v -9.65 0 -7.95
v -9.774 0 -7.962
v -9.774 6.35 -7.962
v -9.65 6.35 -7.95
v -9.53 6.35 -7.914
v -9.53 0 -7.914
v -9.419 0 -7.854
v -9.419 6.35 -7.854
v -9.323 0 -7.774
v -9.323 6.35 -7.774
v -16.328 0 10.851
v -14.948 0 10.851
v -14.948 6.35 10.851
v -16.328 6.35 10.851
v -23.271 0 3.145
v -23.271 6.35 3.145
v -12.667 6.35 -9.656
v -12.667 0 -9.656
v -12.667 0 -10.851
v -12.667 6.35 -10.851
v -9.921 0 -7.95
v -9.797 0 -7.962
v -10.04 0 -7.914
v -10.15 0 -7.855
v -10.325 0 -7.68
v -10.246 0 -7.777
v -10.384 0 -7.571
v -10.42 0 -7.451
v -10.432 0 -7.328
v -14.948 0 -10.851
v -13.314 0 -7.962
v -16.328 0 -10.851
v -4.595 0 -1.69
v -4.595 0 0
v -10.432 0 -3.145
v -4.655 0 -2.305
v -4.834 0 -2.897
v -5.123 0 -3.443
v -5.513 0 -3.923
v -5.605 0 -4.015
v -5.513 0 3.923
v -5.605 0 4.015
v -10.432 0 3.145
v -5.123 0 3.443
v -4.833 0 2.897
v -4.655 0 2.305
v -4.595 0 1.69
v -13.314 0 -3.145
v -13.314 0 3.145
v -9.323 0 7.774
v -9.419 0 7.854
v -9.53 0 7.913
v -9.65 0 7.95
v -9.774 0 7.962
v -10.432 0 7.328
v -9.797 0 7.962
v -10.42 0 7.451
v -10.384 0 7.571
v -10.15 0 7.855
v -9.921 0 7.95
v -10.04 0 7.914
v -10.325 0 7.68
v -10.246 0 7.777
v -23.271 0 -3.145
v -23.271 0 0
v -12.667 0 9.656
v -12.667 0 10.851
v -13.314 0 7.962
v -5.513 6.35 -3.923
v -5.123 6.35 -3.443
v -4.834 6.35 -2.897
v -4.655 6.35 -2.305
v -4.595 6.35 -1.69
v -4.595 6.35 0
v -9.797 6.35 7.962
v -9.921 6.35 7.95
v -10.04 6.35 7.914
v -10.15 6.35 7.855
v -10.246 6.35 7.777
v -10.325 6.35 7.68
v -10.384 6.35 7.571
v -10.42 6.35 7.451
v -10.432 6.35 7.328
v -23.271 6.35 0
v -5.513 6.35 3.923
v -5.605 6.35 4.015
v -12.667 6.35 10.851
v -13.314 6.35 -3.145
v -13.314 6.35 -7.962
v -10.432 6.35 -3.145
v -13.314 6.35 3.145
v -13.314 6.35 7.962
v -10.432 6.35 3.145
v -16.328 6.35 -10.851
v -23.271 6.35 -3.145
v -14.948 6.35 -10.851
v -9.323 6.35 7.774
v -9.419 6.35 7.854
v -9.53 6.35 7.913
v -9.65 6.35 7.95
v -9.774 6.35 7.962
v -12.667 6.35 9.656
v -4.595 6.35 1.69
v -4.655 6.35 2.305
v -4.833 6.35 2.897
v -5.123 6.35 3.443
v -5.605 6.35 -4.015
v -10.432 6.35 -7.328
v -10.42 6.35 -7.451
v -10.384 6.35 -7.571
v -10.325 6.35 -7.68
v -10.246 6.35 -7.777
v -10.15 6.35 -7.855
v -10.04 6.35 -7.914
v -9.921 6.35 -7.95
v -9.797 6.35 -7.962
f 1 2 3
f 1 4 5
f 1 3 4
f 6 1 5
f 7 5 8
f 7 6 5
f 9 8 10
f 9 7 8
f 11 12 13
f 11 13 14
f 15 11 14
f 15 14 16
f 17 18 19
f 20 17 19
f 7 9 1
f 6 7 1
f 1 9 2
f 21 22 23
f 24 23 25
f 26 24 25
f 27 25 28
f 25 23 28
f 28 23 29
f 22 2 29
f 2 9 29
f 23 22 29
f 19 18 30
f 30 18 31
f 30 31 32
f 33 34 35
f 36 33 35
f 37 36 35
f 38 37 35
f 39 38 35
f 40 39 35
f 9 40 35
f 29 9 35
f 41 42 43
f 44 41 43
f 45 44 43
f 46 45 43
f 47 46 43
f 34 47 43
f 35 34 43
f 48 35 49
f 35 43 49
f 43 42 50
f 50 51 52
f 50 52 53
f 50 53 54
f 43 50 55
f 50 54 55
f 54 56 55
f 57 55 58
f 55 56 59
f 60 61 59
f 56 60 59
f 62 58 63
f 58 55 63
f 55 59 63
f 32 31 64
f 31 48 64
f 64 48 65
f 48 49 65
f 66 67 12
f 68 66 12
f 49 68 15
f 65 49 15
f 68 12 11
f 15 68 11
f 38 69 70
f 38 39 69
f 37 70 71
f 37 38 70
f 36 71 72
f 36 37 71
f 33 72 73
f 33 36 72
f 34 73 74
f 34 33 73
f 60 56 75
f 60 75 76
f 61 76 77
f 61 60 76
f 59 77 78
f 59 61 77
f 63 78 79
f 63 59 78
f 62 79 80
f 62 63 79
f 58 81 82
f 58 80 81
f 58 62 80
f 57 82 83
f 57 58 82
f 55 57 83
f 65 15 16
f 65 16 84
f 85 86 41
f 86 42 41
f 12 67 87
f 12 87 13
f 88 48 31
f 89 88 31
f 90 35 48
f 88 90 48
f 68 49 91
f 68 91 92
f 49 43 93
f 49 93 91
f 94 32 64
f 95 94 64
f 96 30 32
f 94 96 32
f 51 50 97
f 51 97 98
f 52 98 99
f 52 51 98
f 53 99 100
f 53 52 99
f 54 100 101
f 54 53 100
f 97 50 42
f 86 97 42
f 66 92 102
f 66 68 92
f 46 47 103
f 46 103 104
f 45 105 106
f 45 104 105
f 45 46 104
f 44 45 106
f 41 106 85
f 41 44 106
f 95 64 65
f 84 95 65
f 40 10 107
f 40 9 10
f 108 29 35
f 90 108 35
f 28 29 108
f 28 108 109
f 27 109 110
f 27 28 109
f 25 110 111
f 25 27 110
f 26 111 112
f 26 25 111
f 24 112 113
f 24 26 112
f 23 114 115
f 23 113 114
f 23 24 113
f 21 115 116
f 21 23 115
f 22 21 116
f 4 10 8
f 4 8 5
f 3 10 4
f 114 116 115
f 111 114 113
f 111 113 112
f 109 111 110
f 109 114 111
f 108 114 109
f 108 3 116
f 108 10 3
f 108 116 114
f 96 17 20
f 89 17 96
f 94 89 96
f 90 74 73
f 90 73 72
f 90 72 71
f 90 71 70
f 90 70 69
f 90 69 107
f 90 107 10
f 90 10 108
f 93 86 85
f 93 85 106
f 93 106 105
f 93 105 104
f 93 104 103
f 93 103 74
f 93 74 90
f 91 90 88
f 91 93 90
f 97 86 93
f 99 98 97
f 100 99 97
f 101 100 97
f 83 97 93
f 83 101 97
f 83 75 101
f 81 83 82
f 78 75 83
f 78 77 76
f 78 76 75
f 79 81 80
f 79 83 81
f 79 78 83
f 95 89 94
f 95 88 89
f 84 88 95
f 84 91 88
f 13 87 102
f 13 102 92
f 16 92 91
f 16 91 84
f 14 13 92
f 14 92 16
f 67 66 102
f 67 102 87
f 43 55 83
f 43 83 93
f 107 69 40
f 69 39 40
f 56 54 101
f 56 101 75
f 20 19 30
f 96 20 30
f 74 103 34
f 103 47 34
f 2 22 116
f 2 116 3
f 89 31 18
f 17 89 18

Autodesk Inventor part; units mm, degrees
ref_plane "YZ Plane" through (0, 0, 0) normal (1, 0, 0) x (0, 1, 0)
ref_plane "XZ Plane" through (0, 0, 0) normal (0, 1, 0) x (-1, 0, 0)
ref_plane "XY Plane" through (0, 0, 0) normal (0, 0, 1) x (1, 0, 0)
sketch "Sketch1" plane through (0, 0, 0) normal (0, 1, 0) x (-1, 0, 0)
  line L0 (-12.7, 12.7) -> (12.7, 12.7)
  line L1 (12.7, 12.7) -> (12.7, -12.7)
  line L2 (12.7, -12.7) -> (-12.7, -12.7)
  line L3 (-12.7, -12.7) -> (-12.7, 12.7)
  line L4 (-12.7, 12.7) -> (12.7, -12.7) construction
  line L5 (12.7, 12.7) -> (-12.7, -12.7) construction
  line L6 (14.9209, 3.2512) -> (10.4791, 3.2512)
  line L7 (10.4791, 3.2512) -> (10.4791, -3.2512)
  line L8 (10.4791, -3.2512) -> (14.9209, -3.2512)
  line L9 (14.9209, -3.2512) -> (14.9209, 3.2512)
  line L10 (14.9209, 3.2512) -> (10.4791, -3.2512) construction
  line L11 (10.4791, 3.2512) -> (14.9209, -3.2512) construction
  line L12 (12.7, 3.2512) -> (10.4902, 3.2512)
  line L13 (10.4902, 3.2512) -> (10.4902, 9.3687)
  line L14 (10.4902, 9.3687) -> (12.7, 9.3687)
  line L15 (12.7, 9.3687) -> (12.7, 3.2512)
  line L16 (-4.5426, 4.5426) -> (4.5426, 4.5426)
  line L17 (4.5426, 1.686) -> (4.5426, -1.686)
  line L18 (4.5426, -4.5426) -> (-4.5426, -4.5426)
  line L19 (-4.5426, -4.5426) -> (-4.5426, 4.5426)
  line L20 (-4.5426, 4.5426) -> (4.5426, -4.5426) construction
  line L21 (4.5426, 4.5426) -> (-4.5426, -4.5426) construction
  line L22 (12.7, 12.7) -> (-12.7, -12.7) construction
  line L23 (11.9293, 13.4707) -> (-13.4707, -11.9293)
  line L24 (5.4725, 3.9311) -> (13.4707, 11.9293)
  arc A0 (13.4707, 11.9293) -> (11.9293, 13.4707) centre (12.7, 12.7) ccw
  arc A1 (-13.4707, -11.9293) -> (-11.9293, -13.4707) centre (-12.7, -12.7) ccw
  line L25 (12.7, -12.7) -> (-12.7, 12.7) construction
  line L26 (11.9293, -13.4707) -> (-13.4707, 11.9293)
  line L27 (5.4725, -3.9311) -> (13.4707, -11.9293)
  arc A2 (11.9293, -13.4707) -> (13.4707, -11.9293) centre (12.7, -12.7) ccw
  arc A3 (-11.9293, 13.4707) -> (-13.4707, 11.9293) centre (-12.7, 12.7) ccw
  arc A4 (5.4725, 3.9311) -> (4.5426, 1.686) centre (7.7176, 1.686) ccw
  arc A5 (4.5426, -1.686) -> (5.4725, -3.9311) centre (7.7176, -1.686) ccw
  point P0 (0, 0)
  point P1 (12.7, 0)
  point P2 (0, 0)
  point P3 (0, 0)
  dimension "d0" = 25.4
  dimension "d1" = 25.4
  dimension "d2" = 6.5024
  dimension "d3" = 2.2098
  dimension "d4" = 3.175
sketch "Sketch2" plane through (0, 0, 0) normal (0, 1, 0) x (-1, 0, 0)
  line L0 (9.3228, 7.7741) -> (5.6047, 4.0154)
  line L1 (5.6047, 4.0154) -> (5.5129, 3.9226)
  line L2 (4.5951, 1.6897) -> (4.5951, 0)
  line L3 (9.7743, 7.9625) -> (9.7971, 7.9625)
  line L4 (10.4321, 7.3275) -> (10.4321, 3.1448)
  line L5 (10.4321, 3.1448) -> (13.3143, 3.1448)
  arc A0 (5.5129, 3.9226) -> (4.5951, 1.6897) centre (7.7701, 1.6897) ccw
  arc A1 (9.7743, 7.9625) -> (9.3228, 7.7741) centre (9.7743, 7.3275) ccw
  arc A2 (10.4321, 7.3275) -> (9.7971, 7.9625) centre (9.7971, 7.3275) ccw
  line L6 (13.3143, 3.1448) -> (13.3143, 7.9625)
  line L7 (13.3143, 7.9625) -> (12.6666, 9.6561)
  line L8 (12.6666, 9.6561) -> (12.6666, 10.8508)
  line L9 (12.6666, 10.8508) -> (14.9475, 10.8508)
  line L10 (14.9475, 10.8508) -> (16.328, 10.8508)
  line L11 (16.328, 10.8508) -> (23.2713, 3.1448)
  line L12 (23.2713, 3.1448) -> (23.2713, 0)
  line L13 (9.3228, -7.7741) -> (5.6047, -4.0154)
  line L14 (4.5951, -1.6897) -> (4.5951, 0)
  line L15 (10.4321, -7.3275) -> (10.4321, -3.1448)
  line L16 (10.4321, -3.1448) -> (13.3143, -3.1448)
  arc A3 (4.5951, -1.6897) -> (5.5129, -3.9226) centre (7.7701, -1.6897) ccw
  arc A4 (9.3228, -7.7741) -> (9.7743, -7.9625) centre (9.7743, -7.3275) ccw
  arc A5 (9.7971, -7.9625) -> (10.4321, -7.3275) centre (9.7971, -7.3275) ccw
  line L17 (13.3143, -3.1448) -> (13.3143, -7.9625)
  line L18 (13.3143, -7.9625) -> (12.6666, -9.6561)
  line L19 (12.6666, -9.6561) -> (12.6666, -10.8508)
  line L20 (12.6666, -10.8508) -> (14.9475, -10.8508)
  line L21 (14.9475, -10.8508) -> (16.328, -10.8508)
  line L22 (16.328, -10.8508) -> (23.2713, -3.1448)
  line L23 (23.2713, -3.1448) -> (23.2713, 0)
  line L24 (5.5129, -3.9226) -> (5.6047, -4.0154)
  line L25 (9.7971, -7.9625) -> (9.7743, -7.9625)
  point P0 (0, 0)
  point P1 (4.5951, 2.9948)
  dimension "d5" = 3.175
  dimension "d6" = 0.635
extrude "Extrusion1" add sketch "Sketch2" along normal blind 6.35
properties part number "sliding_t_nut_prototype01"
